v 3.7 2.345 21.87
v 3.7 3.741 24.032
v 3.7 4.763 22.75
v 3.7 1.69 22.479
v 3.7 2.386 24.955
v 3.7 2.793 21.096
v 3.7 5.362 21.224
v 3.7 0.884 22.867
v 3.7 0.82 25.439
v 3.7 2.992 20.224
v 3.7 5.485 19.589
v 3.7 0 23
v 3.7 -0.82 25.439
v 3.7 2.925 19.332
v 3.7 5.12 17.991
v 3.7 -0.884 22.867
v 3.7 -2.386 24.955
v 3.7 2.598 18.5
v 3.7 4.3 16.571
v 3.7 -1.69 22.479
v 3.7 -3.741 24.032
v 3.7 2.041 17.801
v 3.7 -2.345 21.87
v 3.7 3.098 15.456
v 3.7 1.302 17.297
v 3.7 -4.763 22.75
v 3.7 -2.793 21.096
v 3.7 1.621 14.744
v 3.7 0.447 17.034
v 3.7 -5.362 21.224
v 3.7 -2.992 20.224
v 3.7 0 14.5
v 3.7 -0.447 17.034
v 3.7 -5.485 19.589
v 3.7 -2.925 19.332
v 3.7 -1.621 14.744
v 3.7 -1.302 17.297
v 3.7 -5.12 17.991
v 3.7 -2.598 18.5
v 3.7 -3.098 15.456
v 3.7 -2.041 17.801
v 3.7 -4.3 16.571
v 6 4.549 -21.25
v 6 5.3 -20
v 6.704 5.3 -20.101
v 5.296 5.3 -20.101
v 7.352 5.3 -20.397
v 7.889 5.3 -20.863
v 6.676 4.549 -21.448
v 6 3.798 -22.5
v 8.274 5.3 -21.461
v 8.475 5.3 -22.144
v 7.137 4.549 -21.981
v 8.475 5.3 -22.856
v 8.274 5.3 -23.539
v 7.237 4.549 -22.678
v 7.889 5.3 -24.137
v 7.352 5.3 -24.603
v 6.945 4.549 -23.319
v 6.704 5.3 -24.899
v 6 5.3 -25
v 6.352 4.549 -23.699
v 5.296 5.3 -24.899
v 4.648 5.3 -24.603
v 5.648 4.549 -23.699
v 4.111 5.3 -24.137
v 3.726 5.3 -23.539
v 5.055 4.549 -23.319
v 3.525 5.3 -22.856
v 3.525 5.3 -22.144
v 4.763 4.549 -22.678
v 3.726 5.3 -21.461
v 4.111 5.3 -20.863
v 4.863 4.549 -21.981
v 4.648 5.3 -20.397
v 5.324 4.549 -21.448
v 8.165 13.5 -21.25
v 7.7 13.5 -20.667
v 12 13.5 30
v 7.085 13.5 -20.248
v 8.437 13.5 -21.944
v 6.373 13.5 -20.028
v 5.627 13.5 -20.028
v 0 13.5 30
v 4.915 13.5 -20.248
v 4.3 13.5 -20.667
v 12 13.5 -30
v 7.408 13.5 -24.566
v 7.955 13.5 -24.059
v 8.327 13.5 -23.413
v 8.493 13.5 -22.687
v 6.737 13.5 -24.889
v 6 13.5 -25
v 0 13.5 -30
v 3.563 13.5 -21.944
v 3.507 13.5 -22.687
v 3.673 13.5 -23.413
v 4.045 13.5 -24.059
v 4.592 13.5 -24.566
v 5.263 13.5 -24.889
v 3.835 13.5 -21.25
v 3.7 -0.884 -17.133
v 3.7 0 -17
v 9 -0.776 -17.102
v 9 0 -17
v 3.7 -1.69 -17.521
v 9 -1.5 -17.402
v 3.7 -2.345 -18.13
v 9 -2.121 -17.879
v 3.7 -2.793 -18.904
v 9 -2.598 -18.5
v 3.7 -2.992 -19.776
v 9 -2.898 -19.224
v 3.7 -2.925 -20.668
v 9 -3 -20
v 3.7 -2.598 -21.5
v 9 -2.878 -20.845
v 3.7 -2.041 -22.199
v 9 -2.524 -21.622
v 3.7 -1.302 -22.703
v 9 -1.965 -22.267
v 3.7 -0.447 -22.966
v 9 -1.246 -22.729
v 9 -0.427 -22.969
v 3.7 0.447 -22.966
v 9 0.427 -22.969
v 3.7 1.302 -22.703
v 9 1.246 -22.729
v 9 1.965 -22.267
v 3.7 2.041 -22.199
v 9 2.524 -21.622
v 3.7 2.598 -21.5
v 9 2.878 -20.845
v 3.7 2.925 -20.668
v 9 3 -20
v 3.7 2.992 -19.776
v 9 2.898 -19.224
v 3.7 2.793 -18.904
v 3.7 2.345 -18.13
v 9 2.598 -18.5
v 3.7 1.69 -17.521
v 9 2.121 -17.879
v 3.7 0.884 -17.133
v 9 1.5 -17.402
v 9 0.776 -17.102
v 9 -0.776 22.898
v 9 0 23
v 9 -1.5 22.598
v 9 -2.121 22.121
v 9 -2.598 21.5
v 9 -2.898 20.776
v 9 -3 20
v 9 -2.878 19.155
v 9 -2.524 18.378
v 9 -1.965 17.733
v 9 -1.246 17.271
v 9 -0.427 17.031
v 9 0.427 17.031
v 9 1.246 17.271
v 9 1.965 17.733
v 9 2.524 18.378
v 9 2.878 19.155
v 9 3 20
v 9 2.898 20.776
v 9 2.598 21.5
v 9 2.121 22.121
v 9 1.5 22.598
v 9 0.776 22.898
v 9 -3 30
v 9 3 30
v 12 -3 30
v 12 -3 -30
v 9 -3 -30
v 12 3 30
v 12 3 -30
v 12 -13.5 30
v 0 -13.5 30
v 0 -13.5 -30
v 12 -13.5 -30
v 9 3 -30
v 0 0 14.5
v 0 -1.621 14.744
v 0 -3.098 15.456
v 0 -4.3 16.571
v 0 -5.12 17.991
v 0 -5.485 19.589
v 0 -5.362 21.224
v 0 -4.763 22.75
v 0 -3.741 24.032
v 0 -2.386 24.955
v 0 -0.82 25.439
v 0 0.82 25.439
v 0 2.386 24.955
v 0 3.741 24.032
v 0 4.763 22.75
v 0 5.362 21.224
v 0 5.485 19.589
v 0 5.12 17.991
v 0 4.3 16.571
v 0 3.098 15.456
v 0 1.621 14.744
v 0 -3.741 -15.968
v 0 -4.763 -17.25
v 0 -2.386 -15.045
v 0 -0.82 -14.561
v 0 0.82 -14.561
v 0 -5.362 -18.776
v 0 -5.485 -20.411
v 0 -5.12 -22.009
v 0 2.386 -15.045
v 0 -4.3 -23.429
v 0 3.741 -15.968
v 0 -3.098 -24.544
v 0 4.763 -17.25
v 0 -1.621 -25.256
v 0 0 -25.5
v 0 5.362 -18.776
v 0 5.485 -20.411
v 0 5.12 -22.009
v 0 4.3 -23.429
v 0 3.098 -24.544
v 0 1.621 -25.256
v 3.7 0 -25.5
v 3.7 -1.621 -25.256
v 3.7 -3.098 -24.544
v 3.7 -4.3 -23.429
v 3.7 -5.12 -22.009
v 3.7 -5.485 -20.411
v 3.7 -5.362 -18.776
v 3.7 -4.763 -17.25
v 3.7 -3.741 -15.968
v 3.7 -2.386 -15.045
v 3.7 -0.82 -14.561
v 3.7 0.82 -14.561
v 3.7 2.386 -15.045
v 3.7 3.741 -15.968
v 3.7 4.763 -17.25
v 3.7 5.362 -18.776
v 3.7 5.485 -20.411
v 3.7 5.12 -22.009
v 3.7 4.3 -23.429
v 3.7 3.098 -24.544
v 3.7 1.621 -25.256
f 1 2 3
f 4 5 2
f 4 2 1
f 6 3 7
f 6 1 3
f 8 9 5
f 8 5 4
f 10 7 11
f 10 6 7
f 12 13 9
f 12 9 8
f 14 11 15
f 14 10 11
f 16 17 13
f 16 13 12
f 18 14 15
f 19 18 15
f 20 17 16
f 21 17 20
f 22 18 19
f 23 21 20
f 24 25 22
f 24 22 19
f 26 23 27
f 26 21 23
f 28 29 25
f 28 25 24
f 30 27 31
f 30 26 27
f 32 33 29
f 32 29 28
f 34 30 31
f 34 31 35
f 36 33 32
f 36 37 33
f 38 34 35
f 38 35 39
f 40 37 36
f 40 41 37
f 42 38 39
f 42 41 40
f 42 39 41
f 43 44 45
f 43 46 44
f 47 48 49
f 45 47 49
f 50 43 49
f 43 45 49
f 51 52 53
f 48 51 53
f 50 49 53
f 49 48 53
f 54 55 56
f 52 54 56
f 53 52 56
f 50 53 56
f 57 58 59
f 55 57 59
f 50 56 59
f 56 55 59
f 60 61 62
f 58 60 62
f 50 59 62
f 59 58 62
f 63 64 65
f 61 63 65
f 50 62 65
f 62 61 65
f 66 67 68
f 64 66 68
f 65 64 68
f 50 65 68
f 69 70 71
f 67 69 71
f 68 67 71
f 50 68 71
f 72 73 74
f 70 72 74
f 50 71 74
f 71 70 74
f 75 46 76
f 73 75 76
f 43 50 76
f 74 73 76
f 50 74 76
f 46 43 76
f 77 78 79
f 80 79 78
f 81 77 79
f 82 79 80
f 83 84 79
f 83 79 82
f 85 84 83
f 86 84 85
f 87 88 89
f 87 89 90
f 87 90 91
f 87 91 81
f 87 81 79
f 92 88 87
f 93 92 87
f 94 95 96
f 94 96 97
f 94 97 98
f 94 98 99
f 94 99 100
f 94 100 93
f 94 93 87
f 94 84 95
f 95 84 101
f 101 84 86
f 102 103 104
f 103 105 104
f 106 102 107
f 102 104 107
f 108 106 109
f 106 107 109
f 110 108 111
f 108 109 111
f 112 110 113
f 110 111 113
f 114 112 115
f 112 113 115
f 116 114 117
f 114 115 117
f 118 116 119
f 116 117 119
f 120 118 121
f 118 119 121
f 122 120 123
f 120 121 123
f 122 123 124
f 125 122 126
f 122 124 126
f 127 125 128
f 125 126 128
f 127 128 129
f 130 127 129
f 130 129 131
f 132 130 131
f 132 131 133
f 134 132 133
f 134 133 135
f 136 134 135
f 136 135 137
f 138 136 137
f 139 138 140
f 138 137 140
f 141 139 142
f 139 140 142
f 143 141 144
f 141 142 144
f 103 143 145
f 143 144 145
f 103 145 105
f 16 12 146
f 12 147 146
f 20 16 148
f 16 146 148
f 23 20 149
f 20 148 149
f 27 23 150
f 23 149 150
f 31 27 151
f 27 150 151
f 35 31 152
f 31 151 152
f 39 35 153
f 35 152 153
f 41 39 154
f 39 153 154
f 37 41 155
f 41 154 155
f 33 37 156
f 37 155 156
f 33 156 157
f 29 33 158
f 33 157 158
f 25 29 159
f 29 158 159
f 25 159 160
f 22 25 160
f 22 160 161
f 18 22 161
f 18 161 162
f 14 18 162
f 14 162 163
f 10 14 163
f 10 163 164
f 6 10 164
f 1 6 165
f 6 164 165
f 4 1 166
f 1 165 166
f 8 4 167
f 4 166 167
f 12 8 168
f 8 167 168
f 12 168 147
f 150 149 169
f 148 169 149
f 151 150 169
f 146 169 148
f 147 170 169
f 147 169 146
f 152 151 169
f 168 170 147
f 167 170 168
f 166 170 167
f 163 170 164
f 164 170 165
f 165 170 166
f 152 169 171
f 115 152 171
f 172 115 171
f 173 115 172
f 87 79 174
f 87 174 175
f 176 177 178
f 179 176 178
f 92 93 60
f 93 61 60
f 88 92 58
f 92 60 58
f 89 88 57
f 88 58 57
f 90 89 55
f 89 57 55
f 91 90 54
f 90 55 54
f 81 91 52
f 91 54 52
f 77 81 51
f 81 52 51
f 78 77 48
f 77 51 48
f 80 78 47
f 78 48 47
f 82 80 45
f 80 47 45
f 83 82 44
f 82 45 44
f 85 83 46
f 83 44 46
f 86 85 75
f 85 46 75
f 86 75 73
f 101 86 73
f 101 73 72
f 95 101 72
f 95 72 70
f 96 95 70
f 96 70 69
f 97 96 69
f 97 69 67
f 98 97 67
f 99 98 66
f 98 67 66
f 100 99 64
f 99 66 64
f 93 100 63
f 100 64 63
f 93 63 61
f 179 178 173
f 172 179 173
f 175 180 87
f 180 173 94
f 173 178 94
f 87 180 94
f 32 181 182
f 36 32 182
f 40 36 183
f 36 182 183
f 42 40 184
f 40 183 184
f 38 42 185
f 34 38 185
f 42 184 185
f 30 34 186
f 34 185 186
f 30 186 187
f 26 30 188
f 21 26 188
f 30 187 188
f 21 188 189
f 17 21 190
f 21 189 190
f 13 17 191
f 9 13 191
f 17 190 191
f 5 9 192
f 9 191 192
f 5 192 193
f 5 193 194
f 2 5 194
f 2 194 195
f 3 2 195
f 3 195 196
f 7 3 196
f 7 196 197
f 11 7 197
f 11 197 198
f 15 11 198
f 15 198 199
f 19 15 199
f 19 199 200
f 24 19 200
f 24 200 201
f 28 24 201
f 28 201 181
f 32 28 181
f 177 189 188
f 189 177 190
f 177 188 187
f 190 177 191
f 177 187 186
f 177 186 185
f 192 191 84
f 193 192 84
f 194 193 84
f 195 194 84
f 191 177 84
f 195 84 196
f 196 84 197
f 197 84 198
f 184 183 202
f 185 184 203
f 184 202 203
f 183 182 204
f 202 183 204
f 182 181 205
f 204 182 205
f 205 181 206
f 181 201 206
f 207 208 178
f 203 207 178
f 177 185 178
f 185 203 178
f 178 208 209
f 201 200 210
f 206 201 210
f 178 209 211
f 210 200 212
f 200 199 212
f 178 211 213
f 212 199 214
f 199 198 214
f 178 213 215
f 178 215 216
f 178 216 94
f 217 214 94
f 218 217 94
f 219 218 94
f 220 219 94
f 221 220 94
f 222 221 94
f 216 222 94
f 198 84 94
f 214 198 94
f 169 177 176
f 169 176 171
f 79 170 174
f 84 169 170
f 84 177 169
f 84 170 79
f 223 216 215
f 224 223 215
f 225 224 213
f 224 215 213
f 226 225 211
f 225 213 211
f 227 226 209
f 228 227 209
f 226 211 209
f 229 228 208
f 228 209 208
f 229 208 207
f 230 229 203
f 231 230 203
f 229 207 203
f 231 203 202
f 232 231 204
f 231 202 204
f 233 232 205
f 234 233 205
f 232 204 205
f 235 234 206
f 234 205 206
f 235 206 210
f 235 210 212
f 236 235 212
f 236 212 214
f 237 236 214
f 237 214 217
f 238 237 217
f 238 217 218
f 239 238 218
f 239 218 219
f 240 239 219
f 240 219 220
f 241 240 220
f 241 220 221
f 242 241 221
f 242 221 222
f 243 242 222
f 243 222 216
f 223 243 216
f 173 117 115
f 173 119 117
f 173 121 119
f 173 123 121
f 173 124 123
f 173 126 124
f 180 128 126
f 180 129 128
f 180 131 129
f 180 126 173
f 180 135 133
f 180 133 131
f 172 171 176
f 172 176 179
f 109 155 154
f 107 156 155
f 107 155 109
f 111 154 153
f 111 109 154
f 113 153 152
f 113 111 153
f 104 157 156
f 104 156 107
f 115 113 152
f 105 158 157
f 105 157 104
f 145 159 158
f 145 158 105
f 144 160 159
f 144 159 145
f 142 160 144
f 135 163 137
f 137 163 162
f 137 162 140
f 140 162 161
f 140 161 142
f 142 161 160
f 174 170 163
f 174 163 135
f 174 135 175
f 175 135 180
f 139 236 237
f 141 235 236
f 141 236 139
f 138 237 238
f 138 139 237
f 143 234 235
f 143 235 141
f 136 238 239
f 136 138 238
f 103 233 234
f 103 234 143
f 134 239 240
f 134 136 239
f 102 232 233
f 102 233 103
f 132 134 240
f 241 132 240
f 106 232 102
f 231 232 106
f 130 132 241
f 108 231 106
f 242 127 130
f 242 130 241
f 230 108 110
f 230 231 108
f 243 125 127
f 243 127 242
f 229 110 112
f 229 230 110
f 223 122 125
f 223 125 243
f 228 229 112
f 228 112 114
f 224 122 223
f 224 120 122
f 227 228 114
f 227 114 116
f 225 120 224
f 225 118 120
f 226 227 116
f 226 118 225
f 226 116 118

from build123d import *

# Parameters (mm, degrees)
SKETCH1_W                                = 60
SKETCH1_H                                = 10.5
BOSS_EXTRUDE1_DEPTH                      = 12
BOSS_EXTRUDE1_2_DEPTH                    = 12
SKETCH1_4_W                              = 60
SKETCH1_4_H                              = 6
BOSS_EXTRUDE2_DEPTH                      = 9
CBORE_FOR_M5_PAN_HEAD_SCREW1_D           = 6
CBORE_FOR_M5_PAN_HEAD_SCREW1_CBORE_D     = 11
CBORE_FOR_M5_PAN_HEAD_SCREW1_CBORE_DEPTH = 3.7
F_5_0_5_DIAMETER_HOLE17_D                = 5
F_5_0_5_DIAMETER_HOLE17_DEPTH            = 8.2
F_5_0_5_DIAMETER_HOLE17_TIP              = 1.502151548
F_5_0_5_DIAMETER_HOLE17_ON_FACE_2_D      = 5
F_5_0_5_DIAMETER_HOLE17_ON_FACE_2_DEPTH  = 8.2
F_5_0_5_DIAMETER_HOLE17_ON_FACE_2_TIP    = 1.502151548


with BuildPart() as part:
    # Sketch1 → Boss-Extrude1 (new body)
    with BuildSketch(Plane(origin=(0, 0, 0), x_dir=(0, 0, -1), z_dir=(1, 0, 0))):
        with Locations((0, 8.25)):
            Rectangle(SKETCH1_W, SKETCH1_H)
    extrude(amount=BOSS_EXTRUDE1_DEPTH)



with BuildPart() as body_2:
    # Sketch1 → Boss-Extrude1 2 (new body)
    with BuildSketch(Plane(origin=(0, 0, 0), x_dir=(0, 0, -1), z_dir=(1, 0, 0))):
        with Locations((0, -8.25)):
            Rectangle(SKETCH1_W, SKETCH1_H)
    extrude(amount=BOSS_EXTRUDE1_2_DEPTH)


with BuildPart() as part_1:
    add(part.part)

    add(body_2.part)  # Boss-Extrude2 merges body 2
    # Sketch1<4> → Boss-Extrude2 (add)
    with BuildSketch(Plane(origin=(0, 0, 0), x_dir=(0, 0, -1), z_dir=(1, 0, 0))):
        Rectangle(SKETCH1_4_W, SKETCH1_4_H)
    extrude(amount=BOSS_EXTRUDE2_DEPTH)

    # CBORE for M5 Pan Head Screw1 (through all)
    with Locations(Plane(origin=(0, 0, -20), x_dir=(0, 0, -1), z_dir=(-1, 0, 0))):
        with Locations((0, 0), (-40, 0)):
            CounterBoreHole(CBORE_FOR_M5_PAN_HEAD_SCREW1_D / 2, CBORE_FOR_M5_PAN_HEAD_SCREW1_CBORE_D / 2, CBORE_FOR_M5_PAN_HEAD_SCREW1_CBORE_DEPTH)

    # Ø5.0 (5) Diameter Hole17
    with Locations(Plane(origin=(6, 13.5, -22.5), x_dir=(0, 0, 1), z_dir=(0, 1, 0))):
        with Locations((0, 0)):
            Hole(F_5_0_5_DIAMETER_HOLE17_D / 2, depth=F_5_0_5_DIAMETER_HOLE17_DEPTH)
            with Locations((0, 0, -(F_5_0_5_DIAMETER_HOLE17_DEPTH + F_5_0_5_DIAMETER_HOLE17_TIP / 2))):  # 118° drill point
                Cone(0, F_5_0_5_DIAMETER_HOLE17_D / 2, F_5_0_5_DIAMETER_HOLE17_TIP, mode=Mode.SUBTRACT)

    # Ø5.0 (5) Diameter Hole17 on face 2
    with Locations(Plane(origin=(-4.960948742, 0, -17.906998739), x_dir=(0, 0, 1), z_dir=(0, 1, 0))):
        with Locations((0, 0), (0.436961169, -4.141332284)):
            Hole(F_5_0_5_DIAMETER_HOLE17_ON_FACE_2_D / 2, depth=F_5_0_5_DIAMETER_HOLE17_ON_FACE_2_DEPTH)
            with Locations((0, 0, -(F_5_0_5_DIAMETER_HOLE17_ON_FACE_2_DEPTH + F_5_0_5_DIAMETER_HOLE17_ON_FACE_2_TIP / 2))):  # 118° drill point
                Cone(0, F_5_0_5_DIAMETER_HOLE17_ON_FACE_2_D / 2, F_5_0_5_DIAMETER_HOLE17_ON_FACE_2_TIP, mode=Mode.SUBTRACT)


solid = part_1.part
